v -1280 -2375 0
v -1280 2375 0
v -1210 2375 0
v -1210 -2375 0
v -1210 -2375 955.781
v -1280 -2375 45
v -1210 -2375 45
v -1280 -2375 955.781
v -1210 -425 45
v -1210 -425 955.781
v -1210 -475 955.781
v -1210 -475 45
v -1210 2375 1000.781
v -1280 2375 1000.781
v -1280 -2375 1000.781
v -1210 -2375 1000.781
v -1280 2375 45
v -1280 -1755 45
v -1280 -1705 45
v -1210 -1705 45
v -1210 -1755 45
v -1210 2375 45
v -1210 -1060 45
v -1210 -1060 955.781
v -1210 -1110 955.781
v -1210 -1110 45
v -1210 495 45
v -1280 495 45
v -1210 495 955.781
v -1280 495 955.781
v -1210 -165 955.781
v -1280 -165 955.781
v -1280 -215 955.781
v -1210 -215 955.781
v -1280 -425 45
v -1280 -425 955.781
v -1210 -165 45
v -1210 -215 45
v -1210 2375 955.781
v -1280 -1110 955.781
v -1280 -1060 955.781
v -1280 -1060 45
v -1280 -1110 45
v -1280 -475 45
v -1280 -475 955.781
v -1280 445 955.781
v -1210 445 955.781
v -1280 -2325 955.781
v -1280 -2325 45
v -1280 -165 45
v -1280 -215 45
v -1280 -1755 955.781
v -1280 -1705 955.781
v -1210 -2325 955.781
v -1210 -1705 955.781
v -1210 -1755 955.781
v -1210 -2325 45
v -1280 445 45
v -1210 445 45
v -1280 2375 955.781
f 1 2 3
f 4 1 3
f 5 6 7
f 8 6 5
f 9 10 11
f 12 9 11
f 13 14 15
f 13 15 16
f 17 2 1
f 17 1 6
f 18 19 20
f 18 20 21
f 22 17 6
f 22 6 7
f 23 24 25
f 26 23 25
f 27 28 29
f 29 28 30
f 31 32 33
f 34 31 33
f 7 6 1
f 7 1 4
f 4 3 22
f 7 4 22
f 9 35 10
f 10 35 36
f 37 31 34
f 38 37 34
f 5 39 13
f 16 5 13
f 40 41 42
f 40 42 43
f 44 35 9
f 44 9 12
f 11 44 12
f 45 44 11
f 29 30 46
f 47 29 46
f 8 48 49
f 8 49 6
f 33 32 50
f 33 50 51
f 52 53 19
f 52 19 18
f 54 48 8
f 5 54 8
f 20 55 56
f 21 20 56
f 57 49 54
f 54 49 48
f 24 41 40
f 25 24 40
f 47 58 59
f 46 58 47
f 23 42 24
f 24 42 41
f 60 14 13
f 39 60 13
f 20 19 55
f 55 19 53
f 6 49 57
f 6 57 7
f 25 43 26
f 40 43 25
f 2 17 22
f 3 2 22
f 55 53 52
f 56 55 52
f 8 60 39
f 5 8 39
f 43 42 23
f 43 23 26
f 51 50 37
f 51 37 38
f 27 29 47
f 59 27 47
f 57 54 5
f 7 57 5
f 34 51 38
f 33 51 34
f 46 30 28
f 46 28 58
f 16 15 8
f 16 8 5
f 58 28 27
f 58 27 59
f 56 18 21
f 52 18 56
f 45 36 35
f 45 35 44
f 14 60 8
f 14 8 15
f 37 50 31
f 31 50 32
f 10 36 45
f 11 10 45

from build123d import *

# Parameters (mm, degrees)
F2_W     = 70
F2_H     = 45
F3_DEPTH = 2375
F4_W     = 50
F4_H     = 910.78125
F5_DEPTH = 70


with BuildPart() as f3:
    # F2 (on Front) → F3 (new body, symmetric)
    with BuildSketch(Plane.XZ):
        with Locations((-1245, 22.5)):
            Rectangle(F2_W, F2_H)
    extrude(amount=F3_DEPTH, both=True)


with BuildPart() as f3b:
    # F2 (on Front) → F3, piece 2 (new body, symmetric)
    with BuildSketch(Plane.XZ):
        with Locations((-1245, 978.28125)):
            Rectangle(F2_W, F2_H)
    extrude(amount=F3_DEPTH, both=True)


with BuildPart() as f5:
    # F4 (on face) → F5 (new body, through all)
    with BuildSketch(Plane(origin=(-1280, 0, 0), x_dir=(0, -1, 0), z_dir=(-1, 0, 0))):
        with Locations((2350, 500.390625)):
            Rectangle(F4_W, F4_H)
    extrude(amount=-F5_DEPTH)


with BuildPart() as f5b:
    # F4 (on face) → F5, piece 2 (new body, through all)
    with BuildSketch(Plane(origin=(-1280, 0, 0), x_dir=(0, -1, 0), z_dir=(-1, 0, 0))):
        with Locations((1730, 500.390625)):
            Rectangle(F4_W, F4_H)
    extrude(amount=-F5_DEPTH)


with BuildPart() as f5c:
    # F4 (on face) → F5, piece 3 (new body, through all)
    with BuildSketch(Plane(origin=(-1280, 0, 0), x_dir=(0, -1, 0), z_dir=(-1, 0, 0))):
        with Locations((1085, 500.390625)):
            Rectangle(F4_W, F4_H)
    extrude(amount=-F5_DEPTH)


with BuildPart() as f5d:
    # F4 (on face) → F5, piece 4 (new body, through all)
    with BuildSketch(Plane(origin=(-1280, 0, 0), x_dir=(0, -1, 0), z_dir=(-1, 0, 0))):
        with Locations((450, 500.390625)):
            Rectangle(F4_W, F4_H)
    extrude(amount=-F5_DEPTH)


with BuildPart() as f5e:
    # F4 (on face) → F5, piece 5 (new body, through all)
    with BuildSketch(Plane(origin=(-1280, 0, 0), x_dir=(0, -1, 0), z_dir=(-1, 0, 0))):
        with Locations((190, 500.390625)):
            Rectangle(F4_W, F4_H)
    extrude(amount=-F5_DEPTH)


with BuildPart() as f5f:
    # F4 (on face) → F5, piece 6 (new body, through all)
    with BuildSketch(Plane(origin=(-1280, 0, 0), x_dir=(0, -1, 0), z_dir=(-1, 0, 0))):
        with Locations((-470, 500.390625)):
            Rectangle(F4_W, F4_H)
    extrude(amount=-F5_DEPTH)


solid = Compound([f3.part, f3b.part, f5.part, f5b.part, f5c.part, f5d.part, f5e.part, f5f.part])
